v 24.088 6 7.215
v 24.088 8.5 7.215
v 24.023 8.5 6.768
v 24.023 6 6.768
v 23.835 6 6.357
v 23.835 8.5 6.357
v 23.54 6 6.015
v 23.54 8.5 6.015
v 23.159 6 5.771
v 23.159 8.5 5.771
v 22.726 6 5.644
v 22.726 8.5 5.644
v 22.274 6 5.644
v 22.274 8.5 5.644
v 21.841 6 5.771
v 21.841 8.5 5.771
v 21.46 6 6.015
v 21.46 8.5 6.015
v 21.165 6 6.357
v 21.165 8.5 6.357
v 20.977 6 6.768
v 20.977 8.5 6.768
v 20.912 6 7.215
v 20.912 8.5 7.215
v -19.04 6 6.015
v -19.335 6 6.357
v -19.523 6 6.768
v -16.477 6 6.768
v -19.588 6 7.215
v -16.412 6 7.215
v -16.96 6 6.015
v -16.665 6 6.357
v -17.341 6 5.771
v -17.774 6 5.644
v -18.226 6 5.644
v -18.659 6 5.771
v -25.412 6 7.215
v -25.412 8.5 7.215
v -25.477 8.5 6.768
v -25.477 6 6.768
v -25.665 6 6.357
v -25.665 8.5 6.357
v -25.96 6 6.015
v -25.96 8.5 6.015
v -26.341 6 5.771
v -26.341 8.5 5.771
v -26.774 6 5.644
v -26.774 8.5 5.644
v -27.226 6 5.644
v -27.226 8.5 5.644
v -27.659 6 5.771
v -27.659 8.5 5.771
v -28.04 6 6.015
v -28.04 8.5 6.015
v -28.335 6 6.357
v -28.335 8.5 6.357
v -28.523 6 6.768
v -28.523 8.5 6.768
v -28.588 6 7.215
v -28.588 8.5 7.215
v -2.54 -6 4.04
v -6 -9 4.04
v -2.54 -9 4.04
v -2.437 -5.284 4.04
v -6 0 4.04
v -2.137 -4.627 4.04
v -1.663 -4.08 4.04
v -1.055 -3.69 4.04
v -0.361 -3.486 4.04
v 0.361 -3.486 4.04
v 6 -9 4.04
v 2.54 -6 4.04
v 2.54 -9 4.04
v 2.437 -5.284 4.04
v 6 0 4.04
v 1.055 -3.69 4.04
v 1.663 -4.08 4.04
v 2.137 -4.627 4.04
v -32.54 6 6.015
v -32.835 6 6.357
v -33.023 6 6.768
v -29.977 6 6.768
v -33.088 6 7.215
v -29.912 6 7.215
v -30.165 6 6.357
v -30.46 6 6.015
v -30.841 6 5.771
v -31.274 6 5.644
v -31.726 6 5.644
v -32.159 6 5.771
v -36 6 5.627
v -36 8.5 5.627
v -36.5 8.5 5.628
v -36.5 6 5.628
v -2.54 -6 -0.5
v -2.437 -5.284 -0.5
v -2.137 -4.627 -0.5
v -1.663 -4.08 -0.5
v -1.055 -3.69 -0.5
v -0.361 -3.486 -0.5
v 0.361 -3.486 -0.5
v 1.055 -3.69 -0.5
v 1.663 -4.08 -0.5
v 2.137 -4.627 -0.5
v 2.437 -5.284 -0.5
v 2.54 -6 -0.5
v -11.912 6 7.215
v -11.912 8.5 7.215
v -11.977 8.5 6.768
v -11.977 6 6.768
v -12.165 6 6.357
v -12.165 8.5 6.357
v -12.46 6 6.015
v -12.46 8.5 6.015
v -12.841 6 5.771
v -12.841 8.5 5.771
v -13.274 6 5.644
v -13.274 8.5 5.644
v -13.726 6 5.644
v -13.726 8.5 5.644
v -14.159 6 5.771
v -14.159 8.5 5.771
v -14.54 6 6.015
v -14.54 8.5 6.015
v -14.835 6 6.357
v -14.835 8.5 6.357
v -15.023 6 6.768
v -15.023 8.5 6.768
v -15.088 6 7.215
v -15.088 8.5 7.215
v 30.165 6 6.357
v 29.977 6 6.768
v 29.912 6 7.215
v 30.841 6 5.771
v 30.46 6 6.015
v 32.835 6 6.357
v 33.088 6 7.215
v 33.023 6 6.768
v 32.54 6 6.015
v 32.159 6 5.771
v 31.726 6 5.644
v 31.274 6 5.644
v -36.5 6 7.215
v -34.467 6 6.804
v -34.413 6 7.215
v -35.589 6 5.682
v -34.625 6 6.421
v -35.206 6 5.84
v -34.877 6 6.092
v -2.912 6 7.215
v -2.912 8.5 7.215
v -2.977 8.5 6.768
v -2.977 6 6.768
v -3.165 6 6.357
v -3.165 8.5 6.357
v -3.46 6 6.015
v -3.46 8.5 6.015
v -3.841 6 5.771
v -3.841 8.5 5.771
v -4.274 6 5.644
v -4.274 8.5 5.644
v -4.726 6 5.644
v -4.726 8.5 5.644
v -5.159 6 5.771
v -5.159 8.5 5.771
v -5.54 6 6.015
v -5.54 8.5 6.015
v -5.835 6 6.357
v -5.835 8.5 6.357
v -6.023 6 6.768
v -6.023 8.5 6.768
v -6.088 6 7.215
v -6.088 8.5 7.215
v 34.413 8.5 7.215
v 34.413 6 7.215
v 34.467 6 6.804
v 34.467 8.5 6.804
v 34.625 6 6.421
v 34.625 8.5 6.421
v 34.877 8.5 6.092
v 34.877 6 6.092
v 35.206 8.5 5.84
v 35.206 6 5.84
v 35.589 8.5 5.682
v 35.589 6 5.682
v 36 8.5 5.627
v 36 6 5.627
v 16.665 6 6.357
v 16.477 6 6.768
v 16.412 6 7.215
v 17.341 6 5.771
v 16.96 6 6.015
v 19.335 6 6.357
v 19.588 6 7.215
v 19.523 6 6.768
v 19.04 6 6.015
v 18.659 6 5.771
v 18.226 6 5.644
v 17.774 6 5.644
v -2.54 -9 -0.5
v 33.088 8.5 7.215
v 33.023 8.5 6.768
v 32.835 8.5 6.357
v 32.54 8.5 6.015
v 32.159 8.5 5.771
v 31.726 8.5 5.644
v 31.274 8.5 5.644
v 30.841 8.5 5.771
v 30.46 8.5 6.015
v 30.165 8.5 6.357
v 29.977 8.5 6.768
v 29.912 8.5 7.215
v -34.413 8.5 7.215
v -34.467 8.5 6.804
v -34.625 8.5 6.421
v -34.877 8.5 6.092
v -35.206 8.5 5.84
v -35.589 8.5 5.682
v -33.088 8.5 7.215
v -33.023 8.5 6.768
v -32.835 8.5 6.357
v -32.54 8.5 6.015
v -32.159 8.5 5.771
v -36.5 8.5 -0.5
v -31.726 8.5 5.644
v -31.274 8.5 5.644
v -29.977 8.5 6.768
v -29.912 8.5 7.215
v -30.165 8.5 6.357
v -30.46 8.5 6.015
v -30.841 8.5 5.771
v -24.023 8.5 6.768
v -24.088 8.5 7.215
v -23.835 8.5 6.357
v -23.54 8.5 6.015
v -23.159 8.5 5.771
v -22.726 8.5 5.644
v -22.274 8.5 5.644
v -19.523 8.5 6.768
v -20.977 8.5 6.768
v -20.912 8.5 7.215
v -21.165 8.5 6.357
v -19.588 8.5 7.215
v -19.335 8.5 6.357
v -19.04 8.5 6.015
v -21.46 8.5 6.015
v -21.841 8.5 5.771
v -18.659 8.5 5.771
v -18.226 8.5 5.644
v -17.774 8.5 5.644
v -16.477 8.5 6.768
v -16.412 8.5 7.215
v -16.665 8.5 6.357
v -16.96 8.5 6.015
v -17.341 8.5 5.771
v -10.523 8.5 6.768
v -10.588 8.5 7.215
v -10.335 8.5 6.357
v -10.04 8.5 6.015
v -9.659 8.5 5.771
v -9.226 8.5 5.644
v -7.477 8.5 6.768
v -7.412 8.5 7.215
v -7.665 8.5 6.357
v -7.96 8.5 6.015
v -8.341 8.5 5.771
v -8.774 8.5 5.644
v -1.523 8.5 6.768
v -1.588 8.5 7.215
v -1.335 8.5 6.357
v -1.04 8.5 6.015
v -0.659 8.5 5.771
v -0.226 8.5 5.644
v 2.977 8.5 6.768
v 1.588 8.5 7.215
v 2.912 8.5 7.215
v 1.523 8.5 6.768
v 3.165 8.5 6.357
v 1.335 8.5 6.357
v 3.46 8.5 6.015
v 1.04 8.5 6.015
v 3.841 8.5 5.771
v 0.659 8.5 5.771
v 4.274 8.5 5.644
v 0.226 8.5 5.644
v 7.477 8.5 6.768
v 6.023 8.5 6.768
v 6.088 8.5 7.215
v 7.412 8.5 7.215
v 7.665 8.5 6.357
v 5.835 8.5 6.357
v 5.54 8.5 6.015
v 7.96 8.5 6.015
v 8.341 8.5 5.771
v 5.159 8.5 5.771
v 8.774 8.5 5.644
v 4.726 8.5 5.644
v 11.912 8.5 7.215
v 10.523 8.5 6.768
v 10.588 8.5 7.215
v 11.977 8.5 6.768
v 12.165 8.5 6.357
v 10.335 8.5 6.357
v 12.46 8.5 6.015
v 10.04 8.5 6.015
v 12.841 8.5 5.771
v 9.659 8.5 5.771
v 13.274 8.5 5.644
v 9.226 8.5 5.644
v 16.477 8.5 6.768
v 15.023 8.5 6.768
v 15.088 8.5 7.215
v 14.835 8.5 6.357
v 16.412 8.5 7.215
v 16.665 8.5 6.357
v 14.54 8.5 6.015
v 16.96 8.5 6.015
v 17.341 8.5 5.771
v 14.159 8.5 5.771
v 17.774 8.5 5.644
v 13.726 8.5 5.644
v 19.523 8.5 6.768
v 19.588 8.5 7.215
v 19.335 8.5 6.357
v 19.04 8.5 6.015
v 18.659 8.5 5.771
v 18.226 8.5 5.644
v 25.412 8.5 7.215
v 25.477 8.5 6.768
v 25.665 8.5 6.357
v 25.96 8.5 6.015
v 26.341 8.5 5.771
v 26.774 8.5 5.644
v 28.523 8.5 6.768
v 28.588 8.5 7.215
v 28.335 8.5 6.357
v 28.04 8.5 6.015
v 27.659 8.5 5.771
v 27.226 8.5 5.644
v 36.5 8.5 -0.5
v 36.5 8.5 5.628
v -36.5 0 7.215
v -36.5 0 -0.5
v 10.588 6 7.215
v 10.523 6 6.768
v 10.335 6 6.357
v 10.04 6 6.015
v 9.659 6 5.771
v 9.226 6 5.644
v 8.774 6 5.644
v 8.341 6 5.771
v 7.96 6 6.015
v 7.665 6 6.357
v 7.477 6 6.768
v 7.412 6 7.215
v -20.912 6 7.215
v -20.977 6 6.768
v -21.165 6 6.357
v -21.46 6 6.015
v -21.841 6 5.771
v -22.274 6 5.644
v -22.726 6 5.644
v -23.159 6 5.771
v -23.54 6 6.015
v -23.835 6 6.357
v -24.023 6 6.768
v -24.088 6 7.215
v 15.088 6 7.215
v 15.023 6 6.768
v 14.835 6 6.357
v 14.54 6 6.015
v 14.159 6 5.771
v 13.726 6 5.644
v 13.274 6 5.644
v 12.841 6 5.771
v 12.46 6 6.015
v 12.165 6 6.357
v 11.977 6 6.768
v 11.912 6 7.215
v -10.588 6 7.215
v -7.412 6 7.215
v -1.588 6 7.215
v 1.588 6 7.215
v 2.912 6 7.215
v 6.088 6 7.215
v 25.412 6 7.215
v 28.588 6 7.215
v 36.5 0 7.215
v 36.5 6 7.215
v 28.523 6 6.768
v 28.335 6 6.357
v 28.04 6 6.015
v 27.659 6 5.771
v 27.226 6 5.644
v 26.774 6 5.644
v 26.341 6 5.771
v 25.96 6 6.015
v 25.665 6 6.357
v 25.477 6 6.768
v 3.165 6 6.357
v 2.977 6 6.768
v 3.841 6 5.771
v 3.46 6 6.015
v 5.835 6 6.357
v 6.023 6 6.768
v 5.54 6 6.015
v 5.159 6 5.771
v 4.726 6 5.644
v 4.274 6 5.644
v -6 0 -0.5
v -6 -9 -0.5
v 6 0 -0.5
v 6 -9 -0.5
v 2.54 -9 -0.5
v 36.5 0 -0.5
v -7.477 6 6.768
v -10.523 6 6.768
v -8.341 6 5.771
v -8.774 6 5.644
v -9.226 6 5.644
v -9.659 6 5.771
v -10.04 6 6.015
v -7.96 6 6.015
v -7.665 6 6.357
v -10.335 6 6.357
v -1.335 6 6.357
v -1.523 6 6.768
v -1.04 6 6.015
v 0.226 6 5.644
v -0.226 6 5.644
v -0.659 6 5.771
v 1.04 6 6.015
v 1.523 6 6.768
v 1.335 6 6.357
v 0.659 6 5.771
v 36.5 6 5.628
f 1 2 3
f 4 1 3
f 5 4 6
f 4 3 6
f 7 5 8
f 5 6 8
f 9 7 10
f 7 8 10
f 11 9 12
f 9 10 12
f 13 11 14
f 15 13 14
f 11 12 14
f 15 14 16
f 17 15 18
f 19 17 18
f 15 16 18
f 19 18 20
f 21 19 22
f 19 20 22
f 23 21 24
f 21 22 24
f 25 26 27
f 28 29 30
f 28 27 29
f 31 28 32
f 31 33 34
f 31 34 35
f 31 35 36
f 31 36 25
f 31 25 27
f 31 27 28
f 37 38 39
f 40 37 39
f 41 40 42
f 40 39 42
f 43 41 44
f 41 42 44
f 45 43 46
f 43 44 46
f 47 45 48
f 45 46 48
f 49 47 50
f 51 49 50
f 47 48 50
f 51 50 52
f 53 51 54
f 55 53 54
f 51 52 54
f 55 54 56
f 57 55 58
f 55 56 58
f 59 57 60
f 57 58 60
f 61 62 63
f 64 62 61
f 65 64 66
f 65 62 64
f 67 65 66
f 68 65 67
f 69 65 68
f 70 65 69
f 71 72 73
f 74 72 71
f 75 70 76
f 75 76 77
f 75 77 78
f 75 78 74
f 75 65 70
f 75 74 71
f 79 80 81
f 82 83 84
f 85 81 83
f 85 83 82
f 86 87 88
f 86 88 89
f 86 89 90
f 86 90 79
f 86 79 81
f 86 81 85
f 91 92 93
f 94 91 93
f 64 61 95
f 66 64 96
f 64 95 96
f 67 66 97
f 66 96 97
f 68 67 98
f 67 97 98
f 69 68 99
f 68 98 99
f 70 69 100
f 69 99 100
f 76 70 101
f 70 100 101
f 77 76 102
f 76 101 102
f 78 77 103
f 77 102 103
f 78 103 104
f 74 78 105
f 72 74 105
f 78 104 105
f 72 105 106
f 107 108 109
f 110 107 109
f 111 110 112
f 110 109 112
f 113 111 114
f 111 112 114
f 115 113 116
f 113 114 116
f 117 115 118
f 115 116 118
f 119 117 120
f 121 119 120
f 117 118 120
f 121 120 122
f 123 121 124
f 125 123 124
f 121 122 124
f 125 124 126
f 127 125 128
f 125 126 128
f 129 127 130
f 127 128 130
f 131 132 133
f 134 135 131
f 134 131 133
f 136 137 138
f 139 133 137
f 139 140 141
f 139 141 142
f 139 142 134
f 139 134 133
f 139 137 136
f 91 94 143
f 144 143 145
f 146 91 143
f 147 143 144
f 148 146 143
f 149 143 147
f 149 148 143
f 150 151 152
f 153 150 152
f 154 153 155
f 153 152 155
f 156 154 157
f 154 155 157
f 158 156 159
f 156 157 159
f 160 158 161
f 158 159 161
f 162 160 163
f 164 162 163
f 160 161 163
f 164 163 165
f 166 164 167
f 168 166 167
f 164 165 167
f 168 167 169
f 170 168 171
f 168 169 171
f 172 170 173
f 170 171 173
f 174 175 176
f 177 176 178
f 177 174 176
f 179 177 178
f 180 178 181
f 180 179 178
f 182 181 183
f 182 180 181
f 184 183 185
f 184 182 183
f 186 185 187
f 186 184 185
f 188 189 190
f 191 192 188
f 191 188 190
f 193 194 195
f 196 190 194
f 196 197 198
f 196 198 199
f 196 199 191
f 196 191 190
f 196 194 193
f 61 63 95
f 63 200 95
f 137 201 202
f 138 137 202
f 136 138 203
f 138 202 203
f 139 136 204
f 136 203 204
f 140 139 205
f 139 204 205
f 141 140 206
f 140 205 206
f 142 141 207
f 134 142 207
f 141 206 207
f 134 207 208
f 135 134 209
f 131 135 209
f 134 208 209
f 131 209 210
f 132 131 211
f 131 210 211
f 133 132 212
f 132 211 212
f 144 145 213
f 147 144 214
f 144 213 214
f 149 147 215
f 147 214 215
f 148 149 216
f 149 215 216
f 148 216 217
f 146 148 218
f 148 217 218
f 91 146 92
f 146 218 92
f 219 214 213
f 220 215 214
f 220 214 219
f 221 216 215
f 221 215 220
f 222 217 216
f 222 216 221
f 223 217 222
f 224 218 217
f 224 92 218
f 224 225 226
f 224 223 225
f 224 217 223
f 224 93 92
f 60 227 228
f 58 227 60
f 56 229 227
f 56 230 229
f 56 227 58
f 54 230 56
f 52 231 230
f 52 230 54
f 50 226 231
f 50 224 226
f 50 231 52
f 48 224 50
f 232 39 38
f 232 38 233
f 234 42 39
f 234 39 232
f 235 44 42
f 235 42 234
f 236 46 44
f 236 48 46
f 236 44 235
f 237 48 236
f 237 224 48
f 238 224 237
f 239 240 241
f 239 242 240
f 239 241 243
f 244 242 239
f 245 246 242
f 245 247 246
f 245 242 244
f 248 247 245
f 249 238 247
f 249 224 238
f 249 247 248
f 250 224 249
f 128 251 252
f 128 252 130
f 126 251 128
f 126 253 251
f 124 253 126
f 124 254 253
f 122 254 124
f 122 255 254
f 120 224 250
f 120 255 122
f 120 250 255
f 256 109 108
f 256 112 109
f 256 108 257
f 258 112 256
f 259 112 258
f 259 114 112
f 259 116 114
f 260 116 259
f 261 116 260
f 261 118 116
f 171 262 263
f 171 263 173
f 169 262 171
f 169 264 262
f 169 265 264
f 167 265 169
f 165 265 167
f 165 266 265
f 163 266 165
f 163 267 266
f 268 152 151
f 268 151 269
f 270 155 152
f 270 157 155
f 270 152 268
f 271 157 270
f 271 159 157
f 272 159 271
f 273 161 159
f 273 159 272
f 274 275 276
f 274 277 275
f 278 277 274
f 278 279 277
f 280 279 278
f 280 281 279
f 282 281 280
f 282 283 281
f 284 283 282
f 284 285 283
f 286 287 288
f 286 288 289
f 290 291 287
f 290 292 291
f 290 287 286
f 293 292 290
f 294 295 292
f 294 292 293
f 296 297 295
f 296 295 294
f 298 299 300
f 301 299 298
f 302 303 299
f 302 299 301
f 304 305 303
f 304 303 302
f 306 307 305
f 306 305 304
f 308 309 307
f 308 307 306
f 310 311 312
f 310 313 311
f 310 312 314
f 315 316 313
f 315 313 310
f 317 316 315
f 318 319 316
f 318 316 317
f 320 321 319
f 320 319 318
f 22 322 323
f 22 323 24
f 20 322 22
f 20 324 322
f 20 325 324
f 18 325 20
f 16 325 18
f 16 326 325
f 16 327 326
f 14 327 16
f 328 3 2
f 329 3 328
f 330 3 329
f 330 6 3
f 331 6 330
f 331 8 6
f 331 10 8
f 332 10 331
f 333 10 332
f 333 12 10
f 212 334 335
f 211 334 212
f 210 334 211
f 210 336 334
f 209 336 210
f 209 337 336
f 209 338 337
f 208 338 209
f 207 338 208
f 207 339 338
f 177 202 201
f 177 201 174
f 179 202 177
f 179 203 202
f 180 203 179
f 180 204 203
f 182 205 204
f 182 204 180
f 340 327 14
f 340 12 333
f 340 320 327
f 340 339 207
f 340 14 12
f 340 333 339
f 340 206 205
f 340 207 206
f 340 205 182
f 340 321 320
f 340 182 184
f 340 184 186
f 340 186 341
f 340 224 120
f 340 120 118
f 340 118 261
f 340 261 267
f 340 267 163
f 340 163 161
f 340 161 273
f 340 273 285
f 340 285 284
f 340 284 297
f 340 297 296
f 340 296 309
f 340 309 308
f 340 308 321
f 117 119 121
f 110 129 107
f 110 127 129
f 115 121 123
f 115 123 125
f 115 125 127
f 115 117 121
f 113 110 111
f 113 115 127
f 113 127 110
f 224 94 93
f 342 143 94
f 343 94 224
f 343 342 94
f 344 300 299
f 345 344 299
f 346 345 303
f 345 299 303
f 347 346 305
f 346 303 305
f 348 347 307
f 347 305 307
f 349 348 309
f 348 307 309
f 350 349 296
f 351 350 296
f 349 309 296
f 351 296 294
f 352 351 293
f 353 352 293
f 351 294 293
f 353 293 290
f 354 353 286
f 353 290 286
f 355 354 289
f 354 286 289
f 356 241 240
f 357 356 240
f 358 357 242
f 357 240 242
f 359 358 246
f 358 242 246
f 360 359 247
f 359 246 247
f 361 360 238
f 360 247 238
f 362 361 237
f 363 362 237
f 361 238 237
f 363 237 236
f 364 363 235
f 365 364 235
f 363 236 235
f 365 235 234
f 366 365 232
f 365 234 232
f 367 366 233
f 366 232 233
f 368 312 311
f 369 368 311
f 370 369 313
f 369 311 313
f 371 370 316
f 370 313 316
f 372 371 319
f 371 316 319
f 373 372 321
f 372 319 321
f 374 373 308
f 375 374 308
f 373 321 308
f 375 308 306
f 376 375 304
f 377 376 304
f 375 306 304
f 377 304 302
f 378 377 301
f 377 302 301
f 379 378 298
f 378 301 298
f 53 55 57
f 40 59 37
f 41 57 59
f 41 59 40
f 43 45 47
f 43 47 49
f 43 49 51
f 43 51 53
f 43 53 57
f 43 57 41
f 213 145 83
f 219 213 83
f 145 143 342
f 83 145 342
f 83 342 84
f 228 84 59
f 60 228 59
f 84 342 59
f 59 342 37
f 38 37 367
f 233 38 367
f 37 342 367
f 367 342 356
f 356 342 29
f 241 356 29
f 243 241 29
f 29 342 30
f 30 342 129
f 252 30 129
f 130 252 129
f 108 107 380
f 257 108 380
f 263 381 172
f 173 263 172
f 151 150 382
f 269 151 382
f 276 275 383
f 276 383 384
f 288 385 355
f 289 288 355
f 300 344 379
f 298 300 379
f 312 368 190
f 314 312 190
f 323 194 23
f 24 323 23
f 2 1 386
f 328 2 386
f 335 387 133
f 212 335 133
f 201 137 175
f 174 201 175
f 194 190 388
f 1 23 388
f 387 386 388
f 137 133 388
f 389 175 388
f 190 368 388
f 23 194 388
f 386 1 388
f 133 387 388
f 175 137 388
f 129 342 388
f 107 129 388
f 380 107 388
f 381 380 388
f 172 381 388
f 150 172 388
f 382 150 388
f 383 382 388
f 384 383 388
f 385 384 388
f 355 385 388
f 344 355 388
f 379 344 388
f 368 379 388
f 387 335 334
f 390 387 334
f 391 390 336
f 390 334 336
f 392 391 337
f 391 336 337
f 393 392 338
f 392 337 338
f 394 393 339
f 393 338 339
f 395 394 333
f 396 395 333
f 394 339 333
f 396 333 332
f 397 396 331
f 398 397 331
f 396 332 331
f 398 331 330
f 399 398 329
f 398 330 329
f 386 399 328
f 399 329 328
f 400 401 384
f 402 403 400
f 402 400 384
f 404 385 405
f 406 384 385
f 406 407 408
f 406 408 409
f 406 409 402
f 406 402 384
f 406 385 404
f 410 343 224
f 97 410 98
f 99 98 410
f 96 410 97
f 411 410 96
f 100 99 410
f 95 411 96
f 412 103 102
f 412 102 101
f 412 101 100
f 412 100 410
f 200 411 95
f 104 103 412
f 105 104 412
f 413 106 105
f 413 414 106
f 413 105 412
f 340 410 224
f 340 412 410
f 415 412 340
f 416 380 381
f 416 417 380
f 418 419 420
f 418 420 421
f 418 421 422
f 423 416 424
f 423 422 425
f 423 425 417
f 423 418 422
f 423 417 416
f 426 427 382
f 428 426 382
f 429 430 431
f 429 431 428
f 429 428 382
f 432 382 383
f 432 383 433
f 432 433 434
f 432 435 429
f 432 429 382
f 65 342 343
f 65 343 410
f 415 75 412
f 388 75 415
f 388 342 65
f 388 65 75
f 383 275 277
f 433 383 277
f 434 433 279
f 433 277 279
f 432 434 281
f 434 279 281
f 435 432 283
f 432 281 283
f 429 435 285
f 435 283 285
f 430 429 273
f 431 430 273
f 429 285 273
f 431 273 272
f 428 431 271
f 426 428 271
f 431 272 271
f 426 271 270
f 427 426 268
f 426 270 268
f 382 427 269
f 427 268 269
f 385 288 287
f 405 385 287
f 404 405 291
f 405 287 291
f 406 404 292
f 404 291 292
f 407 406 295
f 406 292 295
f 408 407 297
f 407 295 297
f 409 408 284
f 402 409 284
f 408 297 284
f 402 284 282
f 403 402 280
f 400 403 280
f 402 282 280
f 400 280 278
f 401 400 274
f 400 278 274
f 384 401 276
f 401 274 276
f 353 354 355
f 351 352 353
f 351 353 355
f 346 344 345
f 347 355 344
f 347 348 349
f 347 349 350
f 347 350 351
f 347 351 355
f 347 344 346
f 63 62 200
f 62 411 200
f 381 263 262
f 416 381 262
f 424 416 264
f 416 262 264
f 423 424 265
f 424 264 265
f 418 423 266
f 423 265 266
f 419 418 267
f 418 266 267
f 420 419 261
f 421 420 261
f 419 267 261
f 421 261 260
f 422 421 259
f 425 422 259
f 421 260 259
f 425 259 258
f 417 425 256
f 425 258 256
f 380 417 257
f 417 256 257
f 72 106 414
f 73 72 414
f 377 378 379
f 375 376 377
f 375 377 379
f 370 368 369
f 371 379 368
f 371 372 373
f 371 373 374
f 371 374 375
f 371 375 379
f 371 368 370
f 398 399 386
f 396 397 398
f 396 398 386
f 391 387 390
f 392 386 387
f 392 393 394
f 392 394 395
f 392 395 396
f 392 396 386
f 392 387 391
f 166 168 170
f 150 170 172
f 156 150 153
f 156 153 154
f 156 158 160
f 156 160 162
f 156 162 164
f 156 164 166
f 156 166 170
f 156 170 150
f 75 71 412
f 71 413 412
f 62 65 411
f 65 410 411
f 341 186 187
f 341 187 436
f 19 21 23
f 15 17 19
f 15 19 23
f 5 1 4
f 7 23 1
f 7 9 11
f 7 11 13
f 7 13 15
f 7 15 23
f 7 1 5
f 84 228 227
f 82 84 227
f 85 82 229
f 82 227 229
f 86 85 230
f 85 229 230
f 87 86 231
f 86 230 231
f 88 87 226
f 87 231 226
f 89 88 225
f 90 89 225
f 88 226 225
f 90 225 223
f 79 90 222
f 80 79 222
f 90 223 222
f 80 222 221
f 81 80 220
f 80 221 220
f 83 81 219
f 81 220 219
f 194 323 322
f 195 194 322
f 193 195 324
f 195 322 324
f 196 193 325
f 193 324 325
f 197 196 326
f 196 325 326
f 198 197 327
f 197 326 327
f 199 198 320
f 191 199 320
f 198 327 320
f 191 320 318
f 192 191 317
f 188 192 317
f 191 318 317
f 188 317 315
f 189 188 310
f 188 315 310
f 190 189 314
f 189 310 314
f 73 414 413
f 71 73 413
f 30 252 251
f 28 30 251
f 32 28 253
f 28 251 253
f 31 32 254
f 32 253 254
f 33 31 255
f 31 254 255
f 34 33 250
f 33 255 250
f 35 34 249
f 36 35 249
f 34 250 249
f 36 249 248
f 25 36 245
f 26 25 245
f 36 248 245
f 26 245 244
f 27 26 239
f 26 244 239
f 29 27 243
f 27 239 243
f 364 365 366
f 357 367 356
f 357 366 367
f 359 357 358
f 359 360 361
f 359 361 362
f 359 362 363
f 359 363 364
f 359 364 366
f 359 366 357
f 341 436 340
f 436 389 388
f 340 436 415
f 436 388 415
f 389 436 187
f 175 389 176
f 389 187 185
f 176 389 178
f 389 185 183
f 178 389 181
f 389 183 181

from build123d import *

# Parameters (mm, degrees)
SKETCH1_W                       = 73
SKETCH1_H                       = 7.715
BOSS_EXTRUDE1_DEPTH             = 8.5
BOSS_EXTRUDE5_REACH             = 40.165
BOSS_EXTRUDE5_DIRECTION_2_REACH = 40.165
SKETCH6_W                       = 12
SKETCH6_H                       = 3.715
CUT_EXTRUDE1_DEPTH              = 9
SKETCH7_R                       = 1.5875
CUT_EXTRUDE2_DEPTH              = 2.5
CUT_EXTRUDE3_DEPTH              = 2.54
BOSS_EXTRUDE6_DEPTH             = 2.54


with BuildPart() as part:
    # Sketch1 → Boss-Extrude1 (new body)
    with BuildSketch(Plane(origin=(0, 0, 0), x_dir=(1, 0, 0), z_dir=(0, 1, 0))):
        with Locations((0, -3.3575)):
            Rectangle(SKETCH1_W, SKETCH1_H)
    extrude(amount=BOSS_EXTRUDE1_DEPTH)

    # Boss-Extrude5: up to this face of the body (flat: up to its plane)
    boss_extrude5_end = Plane(part.part.faces().sort_by_distance((0, 4.25, 7.215))[0])
    # Sketch5 → Boss-Extrude5 (add, up to the picked face)
    with BuildSketch(Plane.XY, mode=Mode.PRIVATE) as boss_extrude5_sk1:
        with BuildLine():
            Line((-2.54, -6), (-2.54, -9))
            Line((-2.54, -9), (-6, -9))
            Line((-6, -9), (-6, 0))
            Line((-6, 0), (6, 0))
            Line((6, 0), (6, -9))
            Line((6, -9), (2.54, -9))
            Line((2.54, -9), (2.54, -6))
            ThreePointArc((2.54, -6), (0, -3.46), (-2.54, -6))
        make_face()
    boss_extrude5_tool1 = split(extrude(boss_extrude5_sk1.sketch, amount=BOSS_EXTRUDE5_REACH, mode=Mode.PRIVATE), bisect_by=boss_extrude5_end, keep=Keep.BOTH, mode=Mode.PRIVATE)
    add(boss_extrude5_tool1.solids().sort_by(Axis((-2.69, -7.5, 0), (0, 0, 1)))[0])

    # Boss-Extrude5 direction 2: up to this face of the body (flat: up to its plane)
    boss_extrude5_direction_2_end = Plane(part.part.faces().sort_by_distance((0, 4.25, -0.5))[0])
    # Sketch5 → Boss-Extrude5 direction 2 (add, up to the picked face)
    with BuildSketch(Plane.XY, mode=Mode.PRIVATE) as boss_extrude5_direction_2_sk1:
        with BuildLine():
            Line((-2.54, -6), (-2.54, -9))
            Line((-2.54, -9), (-6, -9))
            Line((-6, -9), (-6, 0))
            Line((-6, 0), (6, 0))
            Line((6, 0), (6, -9))
            Line((6, -9), (2.54, -9))
            Line((2.54, -9), (2.54, -6))
            ThreePointArc((2.54, -6), (0, -3.46), (-2.54, -6))
        make_face()
    boss_extrude5_direction_2_tool1 = split(extrude(boss_extrude5_direction_2_sk1.sketch, amount=-BOSS_EXTRUDE5_DIRECTION_2_REACH, mode=Mode.PRIVATE), bisect_by=boss_extrude5_direction_2_end, keep=Keep.BOTH, mode=Mode.PRIVATE)
    add(boss_extrude5_direction_2_tool1.solids().sort_by(Axis((-2.69, -7.5, 0), (0, 0, -1)))[0])

    # Sketch6 → Cut-Extrude1 (cut)
    with BuildSketch(Plane.XZ.offset(9)):
        with Locations((0, 3.3575)):
            Rectangle(SKETCH6_W, SKETCH6_H)
    extrude(amount=-CUT_EXTRUDE1_DEPTH, mode=Mode.SUBTRACT)

    # Sketch7 → Cut-Extrude2 (cut)
    with BuildSketch(Plane(origin=(0, 8.5, 0), x_dir=(1, 0, 0), z_dir=(0, 1, 0))):
        with Locations((0, -7.215)):
            Circle(SKETCH7_R)
        with Locations((4.5, -7.215)):
            Circle(SKETCH7_R)
        with Locations((9, -7.215)):
            Circle(SKETCH7_R)
        with Locations((13.5, -7.215)):
            Circle(SKETCH7_R)
        with Locations((18, -7.215)):
            Circle(SKETCH7_R)
        with Locations((22.5, -7.215)):
            Circle(SKETCH7_R)
        with Locations((27, -7.215)):
            Circle(SKETCH7_R)
        with Locations((31.5, -7.215)):
            Circle(SKETCH7_R)
        with Locations((-31.5, -7.215)):
            Circle(SKETCH7_R)
        with Locations((-27, -7.215)):
            Circle(SKETCH7_R)
        with Locations((-22.5, -7.215)):
            Circle(SKETCH7_R)
        with Locations((-18, -7.215)):
            Circle(SKETCH7_R)
        with Locations((-13.5, -7.215)):
            Circle(SKETCH7_R)
        with Locations((-9, -7.215)):
            Circle(SKETCH7_R)
        with Locations((-4.5, -7.215)):
            Circle(SKETCH7_R)
        with BuildLine():
            Line((36, -5.6275), (36.5, -5.6275))
            Line((36.5, -5.6275), (36.5, -5.70829623))
            ThreePointArc((36.5, -5.70829623), (35.746757018, -8.782170776), (36, -5.6275))
        make_face()
        with BuildLine():
            Line((-36.5, -5.6275), (-36.5, -5.70829623))
            ThreePointArc((-36.5, -5.70829623), (-35.746757018, -8.782170776), (-36, -5.6275))
            Line((-36, -5.6275), (-36.5, -5.6275))
        make_face()
    extrude(amount=-CUT_EXTRUDE2_DEPTH, mode=Mode.SUBTRACT)

    # Sketch8 → Cut-Extrude3 (cut)
    with BuildSketch(Plane(origin=(0, 0, 5.215), x_dir=(-1, 0, 0), z_dir=(0, 0, -1))):
        with BuildLine():
            Line((2.54, -6), (2.54, -9))
            Line((2.54, -9), (6, -9))
            Line((6, -9), (6, 0))
            Line((6, 0), (-6, 0))
            Line((-6, 0), (-6, -9))
            Line((-6, -9), (-2.54, -9))
            Line((-2.54, -9), (-2.54, -6))
            ThreePointArc((-2.54, -6), (0, -3.46), (2.54, -6))
        make_face()
    extrude(amount=-CUT_EXTRUDE3_DEPTH, mode=Mode.SUBTRACT)

    # Sketch9 → Boss-Extrude6 (add)
    with BuildSketch(Plane.XY.offset(1.5)):
        with BuildLine():
            Line((2.54, -9), (6, -9))
            Line((6, -9), (6, 0))
            Line((6, 0), (-6, 0))
            Line((-6, 0), (-6, -9))
            Line((-6, -9), (-2.54, -9))
            Line((-2.54, -9), (-2.54, -6))
            ThreePointArc((-2.54, -6), (0, -3.46), (2.54, -6))
            Line((2.54, -6), (2.54, -9))
        make_face()
    extrude(amount=BOSS_EXTRUDE6_DEPTH)


solid = part.part
